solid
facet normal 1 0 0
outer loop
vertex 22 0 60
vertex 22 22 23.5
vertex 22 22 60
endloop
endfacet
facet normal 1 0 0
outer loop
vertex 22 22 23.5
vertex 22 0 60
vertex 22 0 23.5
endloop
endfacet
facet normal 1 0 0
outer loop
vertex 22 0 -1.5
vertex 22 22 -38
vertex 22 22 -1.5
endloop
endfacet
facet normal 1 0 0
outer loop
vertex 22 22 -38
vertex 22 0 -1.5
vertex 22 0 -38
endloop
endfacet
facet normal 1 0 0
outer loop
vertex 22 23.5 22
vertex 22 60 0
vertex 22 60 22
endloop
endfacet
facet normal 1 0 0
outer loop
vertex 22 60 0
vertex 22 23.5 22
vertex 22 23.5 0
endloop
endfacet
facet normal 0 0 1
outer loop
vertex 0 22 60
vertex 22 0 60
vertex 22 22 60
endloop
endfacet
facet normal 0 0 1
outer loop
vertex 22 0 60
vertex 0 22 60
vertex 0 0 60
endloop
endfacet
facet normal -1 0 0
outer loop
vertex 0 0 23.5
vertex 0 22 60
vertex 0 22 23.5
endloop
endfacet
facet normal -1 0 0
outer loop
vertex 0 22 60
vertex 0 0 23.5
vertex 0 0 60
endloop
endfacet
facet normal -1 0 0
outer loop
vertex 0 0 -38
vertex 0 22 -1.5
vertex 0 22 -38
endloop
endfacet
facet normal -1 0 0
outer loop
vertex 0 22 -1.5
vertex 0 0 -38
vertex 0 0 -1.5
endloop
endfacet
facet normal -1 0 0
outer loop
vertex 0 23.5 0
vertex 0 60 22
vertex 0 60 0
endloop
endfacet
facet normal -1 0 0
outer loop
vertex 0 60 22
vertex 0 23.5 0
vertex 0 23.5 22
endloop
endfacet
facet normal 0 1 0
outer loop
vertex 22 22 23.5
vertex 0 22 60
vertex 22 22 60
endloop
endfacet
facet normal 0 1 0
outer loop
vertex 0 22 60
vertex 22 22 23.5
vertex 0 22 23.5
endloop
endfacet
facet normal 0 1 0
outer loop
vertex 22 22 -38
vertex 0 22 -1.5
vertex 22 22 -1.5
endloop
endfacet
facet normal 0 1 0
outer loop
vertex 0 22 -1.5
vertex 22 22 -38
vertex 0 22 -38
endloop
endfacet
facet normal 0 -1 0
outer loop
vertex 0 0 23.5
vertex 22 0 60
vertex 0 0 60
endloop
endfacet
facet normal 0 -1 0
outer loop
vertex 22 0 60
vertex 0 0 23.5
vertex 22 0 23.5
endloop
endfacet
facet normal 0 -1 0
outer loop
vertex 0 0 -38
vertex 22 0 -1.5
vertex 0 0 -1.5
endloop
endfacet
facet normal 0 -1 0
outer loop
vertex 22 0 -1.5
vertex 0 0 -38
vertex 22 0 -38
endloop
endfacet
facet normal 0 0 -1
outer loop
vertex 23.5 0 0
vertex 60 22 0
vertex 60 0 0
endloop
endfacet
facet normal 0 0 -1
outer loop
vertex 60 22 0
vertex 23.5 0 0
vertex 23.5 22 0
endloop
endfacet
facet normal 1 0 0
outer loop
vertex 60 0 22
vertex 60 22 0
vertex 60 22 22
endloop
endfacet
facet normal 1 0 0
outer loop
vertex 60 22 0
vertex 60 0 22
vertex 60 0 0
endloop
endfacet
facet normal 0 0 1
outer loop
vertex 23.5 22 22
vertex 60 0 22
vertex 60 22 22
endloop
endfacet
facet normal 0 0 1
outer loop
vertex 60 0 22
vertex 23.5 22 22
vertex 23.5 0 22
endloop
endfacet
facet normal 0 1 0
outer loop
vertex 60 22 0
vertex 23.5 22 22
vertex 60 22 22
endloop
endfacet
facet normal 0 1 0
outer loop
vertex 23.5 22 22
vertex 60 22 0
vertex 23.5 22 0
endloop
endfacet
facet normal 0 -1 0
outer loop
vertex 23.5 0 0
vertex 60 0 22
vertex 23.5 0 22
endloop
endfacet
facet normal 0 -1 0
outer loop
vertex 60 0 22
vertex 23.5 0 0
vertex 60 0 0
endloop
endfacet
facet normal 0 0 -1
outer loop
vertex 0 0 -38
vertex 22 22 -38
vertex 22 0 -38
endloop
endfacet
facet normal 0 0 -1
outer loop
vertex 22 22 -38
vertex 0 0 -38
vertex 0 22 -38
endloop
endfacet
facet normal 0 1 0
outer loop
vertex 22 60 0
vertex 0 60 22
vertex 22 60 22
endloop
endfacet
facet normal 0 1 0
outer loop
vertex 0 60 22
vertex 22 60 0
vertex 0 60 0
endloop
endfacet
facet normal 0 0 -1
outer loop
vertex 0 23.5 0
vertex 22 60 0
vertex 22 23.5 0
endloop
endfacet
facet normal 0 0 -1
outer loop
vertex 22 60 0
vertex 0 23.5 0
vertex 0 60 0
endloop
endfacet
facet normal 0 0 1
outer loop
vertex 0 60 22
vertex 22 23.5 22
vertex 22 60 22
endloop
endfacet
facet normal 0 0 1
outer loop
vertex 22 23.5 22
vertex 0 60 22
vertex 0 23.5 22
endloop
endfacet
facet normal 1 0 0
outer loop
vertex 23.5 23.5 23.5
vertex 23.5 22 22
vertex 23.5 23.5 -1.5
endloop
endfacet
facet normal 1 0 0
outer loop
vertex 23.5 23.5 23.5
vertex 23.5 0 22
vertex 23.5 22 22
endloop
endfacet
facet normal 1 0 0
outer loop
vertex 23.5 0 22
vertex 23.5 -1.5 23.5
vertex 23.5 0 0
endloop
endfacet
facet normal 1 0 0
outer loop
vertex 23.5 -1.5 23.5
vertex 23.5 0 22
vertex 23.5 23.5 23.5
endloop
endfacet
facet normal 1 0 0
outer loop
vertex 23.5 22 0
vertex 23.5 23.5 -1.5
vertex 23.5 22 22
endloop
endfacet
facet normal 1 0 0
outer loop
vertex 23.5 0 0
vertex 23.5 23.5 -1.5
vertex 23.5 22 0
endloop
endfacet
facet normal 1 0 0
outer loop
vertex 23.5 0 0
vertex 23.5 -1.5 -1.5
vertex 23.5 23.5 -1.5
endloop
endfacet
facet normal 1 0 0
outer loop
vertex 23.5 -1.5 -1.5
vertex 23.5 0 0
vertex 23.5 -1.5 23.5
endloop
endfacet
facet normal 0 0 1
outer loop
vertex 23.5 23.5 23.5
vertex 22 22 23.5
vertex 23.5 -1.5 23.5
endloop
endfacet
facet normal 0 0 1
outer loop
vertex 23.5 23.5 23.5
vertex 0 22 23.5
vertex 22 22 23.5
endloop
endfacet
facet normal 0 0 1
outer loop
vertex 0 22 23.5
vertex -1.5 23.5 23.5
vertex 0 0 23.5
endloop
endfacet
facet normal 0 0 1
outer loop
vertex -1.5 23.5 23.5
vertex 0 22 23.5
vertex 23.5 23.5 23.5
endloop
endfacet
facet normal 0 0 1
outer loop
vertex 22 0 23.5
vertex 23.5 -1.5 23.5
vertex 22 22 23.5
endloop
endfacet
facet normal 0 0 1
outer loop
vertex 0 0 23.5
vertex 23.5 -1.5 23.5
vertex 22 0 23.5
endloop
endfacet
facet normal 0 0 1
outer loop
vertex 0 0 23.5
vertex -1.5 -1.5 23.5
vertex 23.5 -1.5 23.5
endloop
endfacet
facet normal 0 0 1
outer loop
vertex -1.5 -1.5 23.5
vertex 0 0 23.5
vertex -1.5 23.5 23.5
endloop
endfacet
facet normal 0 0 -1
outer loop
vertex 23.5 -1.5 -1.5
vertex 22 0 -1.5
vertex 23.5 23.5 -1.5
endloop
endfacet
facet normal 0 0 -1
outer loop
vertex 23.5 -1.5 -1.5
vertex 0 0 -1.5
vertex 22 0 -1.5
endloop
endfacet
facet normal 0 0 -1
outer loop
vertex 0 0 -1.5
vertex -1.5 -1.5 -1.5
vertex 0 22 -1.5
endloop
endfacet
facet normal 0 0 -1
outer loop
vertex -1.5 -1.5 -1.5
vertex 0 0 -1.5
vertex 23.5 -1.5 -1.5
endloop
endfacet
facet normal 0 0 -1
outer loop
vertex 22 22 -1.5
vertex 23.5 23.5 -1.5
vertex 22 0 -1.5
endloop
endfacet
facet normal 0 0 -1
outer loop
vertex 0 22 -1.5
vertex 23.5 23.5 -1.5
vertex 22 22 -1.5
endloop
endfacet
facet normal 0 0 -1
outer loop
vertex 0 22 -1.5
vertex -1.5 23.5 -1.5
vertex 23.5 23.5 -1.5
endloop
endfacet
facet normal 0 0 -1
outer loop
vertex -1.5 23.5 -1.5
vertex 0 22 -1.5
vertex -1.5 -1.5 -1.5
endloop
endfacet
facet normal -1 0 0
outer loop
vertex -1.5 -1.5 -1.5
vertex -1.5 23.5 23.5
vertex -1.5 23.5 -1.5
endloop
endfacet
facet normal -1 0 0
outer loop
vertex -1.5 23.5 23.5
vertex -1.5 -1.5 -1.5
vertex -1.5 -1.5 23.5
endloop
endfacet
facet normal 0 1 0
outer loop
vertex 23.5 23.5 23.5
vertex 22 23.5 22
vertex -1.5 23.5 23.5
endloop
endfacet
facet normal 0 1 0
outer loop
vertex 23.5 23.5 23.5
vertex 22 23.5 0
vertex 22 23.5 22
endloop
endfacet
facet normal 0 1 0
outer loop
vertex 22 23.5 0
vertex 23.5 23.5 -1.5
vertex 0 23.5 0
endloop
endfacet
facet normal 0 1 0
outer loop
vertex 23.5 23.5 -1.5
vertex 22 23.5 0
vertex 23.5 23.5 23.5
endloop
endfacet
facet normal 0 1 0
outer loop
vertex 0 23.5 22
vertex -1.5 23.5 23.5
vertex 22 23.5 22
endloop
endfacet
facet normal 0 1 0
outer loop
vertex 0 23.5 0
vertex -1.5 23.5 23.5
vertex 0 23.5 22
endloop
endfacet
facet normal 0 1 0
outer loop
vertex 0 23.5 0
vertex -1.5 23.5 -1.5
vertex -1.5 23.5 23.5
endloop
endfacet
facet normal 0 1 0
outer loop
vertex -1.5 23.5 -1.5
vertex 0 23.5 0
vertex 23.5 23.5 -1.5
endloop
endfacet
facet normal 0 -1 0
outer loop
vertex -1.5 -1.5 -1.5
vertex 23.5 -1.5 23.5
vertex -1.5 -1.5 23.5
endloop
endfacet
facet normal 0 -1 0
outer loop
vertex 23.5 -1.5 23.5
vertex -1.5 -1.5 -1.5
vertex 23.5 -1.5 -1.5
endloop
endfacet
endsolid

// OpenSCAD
profile_thickness = 1.5;

dimensions = [22,22, 60]; // 
jackl_dimensions = [25,25,25];
type = "middle_part"; // [middle_part, end_part, upper_part, lower_part, connector_part]

$fn=60;

module base() {
    cube(dimensions);
    
//    translate([0,22/4,0]) cylinder(r=1, h=dimensions[2]);
//    translate([0,22/4*2,0]) cylinder(r=1, h=dimensions[2]);
//    translate([0,22/4*3,0]) cylinder(r=1, h=dimensions[2]);

}

module lower_part() {
    translate([profile_thickness,profile_thickness,0]) base();
    translate([0,profile_thickness,dimensions[0]]) rotate([0,90,0]) base();
    translate([dimensions[0],0,dimensions[0]]) rotate([0,180,0]) base();
    translate([profile_thickness,0,dimensions[0]]) rotate([-90,0,0]) base();

    translate([0,0,-profile_thickness]) cube(jackl_dimensions);
    translate([0,0,-dimensions[2]+dimensions[1]]) cube([jackl_dimensions[0], jackl_dimensions[1], dimensions[2]]);
}

//lower_part();

module middle_part() {
    translate([0,0,0]) base();
    translate([0,0,dimensions[0]]) rotate([0,90,0]) base();
    translate([dimensions[0],0,dimensions[0]]) rotate([0,180,0]) base();
    translate([0,0,dimensions[0]]) rotate([-90,0,0]) base();

    translate([-profile_thickness,-profile_thickness,-profile_thickness]) cube(jackl_dimensions);

}

//middle_part();

module upper_part() {
    translate([0,0,0]) base();
    translate([0,0,dimensions[0]]) rotate([0,90,0]) base();
    translate([0,0,dimensions[0]]) rotate([-90,0,0]) base();

    translate([-profile_thickness,-profile_thickness,-profile_thickness]) cube(jackl_dimensions);

}

module t_part() {
    translate([0,0,0]) base();
    translate([0,0,dimensions[0]]) rotate([0,90,0]) base();
    translate([dimensions[0],0,dimensions[0]]) rotate([0,180,0]) base();

    translate([-profile_thickness,-profile_thickness,-profile_thickness]) cube(jackl_dimensions);
}

module end_part() {
    cube([dimensions[0], dimensions[1], 12]);
    translate([-profile_thickness, -profile_thickness, -3]) cube([jackl_dimensions[0], jackl_dimensions[1], 3]);
}

module connector_part() {
    translate([0,0,0]) base();
    translate([dimensions[0],0,dimensions[0]]) rotate([0,180,0]) base();

    translate([-profile_thickness,-profile_thickness,-profile_thickness]) cube(jackl_dimensions);
}


if (type=="connector_part") {
    connector_part();
}
if (type=="end_part") {

    end_part();
}


if (type=="upper_part") {
    upper_part();
}

if (type=="lower_part") {
    lower_part();
}
if (type=="middle_part") {
    middle_part();
}
if (type=="t_part") {
    t_part();
}
